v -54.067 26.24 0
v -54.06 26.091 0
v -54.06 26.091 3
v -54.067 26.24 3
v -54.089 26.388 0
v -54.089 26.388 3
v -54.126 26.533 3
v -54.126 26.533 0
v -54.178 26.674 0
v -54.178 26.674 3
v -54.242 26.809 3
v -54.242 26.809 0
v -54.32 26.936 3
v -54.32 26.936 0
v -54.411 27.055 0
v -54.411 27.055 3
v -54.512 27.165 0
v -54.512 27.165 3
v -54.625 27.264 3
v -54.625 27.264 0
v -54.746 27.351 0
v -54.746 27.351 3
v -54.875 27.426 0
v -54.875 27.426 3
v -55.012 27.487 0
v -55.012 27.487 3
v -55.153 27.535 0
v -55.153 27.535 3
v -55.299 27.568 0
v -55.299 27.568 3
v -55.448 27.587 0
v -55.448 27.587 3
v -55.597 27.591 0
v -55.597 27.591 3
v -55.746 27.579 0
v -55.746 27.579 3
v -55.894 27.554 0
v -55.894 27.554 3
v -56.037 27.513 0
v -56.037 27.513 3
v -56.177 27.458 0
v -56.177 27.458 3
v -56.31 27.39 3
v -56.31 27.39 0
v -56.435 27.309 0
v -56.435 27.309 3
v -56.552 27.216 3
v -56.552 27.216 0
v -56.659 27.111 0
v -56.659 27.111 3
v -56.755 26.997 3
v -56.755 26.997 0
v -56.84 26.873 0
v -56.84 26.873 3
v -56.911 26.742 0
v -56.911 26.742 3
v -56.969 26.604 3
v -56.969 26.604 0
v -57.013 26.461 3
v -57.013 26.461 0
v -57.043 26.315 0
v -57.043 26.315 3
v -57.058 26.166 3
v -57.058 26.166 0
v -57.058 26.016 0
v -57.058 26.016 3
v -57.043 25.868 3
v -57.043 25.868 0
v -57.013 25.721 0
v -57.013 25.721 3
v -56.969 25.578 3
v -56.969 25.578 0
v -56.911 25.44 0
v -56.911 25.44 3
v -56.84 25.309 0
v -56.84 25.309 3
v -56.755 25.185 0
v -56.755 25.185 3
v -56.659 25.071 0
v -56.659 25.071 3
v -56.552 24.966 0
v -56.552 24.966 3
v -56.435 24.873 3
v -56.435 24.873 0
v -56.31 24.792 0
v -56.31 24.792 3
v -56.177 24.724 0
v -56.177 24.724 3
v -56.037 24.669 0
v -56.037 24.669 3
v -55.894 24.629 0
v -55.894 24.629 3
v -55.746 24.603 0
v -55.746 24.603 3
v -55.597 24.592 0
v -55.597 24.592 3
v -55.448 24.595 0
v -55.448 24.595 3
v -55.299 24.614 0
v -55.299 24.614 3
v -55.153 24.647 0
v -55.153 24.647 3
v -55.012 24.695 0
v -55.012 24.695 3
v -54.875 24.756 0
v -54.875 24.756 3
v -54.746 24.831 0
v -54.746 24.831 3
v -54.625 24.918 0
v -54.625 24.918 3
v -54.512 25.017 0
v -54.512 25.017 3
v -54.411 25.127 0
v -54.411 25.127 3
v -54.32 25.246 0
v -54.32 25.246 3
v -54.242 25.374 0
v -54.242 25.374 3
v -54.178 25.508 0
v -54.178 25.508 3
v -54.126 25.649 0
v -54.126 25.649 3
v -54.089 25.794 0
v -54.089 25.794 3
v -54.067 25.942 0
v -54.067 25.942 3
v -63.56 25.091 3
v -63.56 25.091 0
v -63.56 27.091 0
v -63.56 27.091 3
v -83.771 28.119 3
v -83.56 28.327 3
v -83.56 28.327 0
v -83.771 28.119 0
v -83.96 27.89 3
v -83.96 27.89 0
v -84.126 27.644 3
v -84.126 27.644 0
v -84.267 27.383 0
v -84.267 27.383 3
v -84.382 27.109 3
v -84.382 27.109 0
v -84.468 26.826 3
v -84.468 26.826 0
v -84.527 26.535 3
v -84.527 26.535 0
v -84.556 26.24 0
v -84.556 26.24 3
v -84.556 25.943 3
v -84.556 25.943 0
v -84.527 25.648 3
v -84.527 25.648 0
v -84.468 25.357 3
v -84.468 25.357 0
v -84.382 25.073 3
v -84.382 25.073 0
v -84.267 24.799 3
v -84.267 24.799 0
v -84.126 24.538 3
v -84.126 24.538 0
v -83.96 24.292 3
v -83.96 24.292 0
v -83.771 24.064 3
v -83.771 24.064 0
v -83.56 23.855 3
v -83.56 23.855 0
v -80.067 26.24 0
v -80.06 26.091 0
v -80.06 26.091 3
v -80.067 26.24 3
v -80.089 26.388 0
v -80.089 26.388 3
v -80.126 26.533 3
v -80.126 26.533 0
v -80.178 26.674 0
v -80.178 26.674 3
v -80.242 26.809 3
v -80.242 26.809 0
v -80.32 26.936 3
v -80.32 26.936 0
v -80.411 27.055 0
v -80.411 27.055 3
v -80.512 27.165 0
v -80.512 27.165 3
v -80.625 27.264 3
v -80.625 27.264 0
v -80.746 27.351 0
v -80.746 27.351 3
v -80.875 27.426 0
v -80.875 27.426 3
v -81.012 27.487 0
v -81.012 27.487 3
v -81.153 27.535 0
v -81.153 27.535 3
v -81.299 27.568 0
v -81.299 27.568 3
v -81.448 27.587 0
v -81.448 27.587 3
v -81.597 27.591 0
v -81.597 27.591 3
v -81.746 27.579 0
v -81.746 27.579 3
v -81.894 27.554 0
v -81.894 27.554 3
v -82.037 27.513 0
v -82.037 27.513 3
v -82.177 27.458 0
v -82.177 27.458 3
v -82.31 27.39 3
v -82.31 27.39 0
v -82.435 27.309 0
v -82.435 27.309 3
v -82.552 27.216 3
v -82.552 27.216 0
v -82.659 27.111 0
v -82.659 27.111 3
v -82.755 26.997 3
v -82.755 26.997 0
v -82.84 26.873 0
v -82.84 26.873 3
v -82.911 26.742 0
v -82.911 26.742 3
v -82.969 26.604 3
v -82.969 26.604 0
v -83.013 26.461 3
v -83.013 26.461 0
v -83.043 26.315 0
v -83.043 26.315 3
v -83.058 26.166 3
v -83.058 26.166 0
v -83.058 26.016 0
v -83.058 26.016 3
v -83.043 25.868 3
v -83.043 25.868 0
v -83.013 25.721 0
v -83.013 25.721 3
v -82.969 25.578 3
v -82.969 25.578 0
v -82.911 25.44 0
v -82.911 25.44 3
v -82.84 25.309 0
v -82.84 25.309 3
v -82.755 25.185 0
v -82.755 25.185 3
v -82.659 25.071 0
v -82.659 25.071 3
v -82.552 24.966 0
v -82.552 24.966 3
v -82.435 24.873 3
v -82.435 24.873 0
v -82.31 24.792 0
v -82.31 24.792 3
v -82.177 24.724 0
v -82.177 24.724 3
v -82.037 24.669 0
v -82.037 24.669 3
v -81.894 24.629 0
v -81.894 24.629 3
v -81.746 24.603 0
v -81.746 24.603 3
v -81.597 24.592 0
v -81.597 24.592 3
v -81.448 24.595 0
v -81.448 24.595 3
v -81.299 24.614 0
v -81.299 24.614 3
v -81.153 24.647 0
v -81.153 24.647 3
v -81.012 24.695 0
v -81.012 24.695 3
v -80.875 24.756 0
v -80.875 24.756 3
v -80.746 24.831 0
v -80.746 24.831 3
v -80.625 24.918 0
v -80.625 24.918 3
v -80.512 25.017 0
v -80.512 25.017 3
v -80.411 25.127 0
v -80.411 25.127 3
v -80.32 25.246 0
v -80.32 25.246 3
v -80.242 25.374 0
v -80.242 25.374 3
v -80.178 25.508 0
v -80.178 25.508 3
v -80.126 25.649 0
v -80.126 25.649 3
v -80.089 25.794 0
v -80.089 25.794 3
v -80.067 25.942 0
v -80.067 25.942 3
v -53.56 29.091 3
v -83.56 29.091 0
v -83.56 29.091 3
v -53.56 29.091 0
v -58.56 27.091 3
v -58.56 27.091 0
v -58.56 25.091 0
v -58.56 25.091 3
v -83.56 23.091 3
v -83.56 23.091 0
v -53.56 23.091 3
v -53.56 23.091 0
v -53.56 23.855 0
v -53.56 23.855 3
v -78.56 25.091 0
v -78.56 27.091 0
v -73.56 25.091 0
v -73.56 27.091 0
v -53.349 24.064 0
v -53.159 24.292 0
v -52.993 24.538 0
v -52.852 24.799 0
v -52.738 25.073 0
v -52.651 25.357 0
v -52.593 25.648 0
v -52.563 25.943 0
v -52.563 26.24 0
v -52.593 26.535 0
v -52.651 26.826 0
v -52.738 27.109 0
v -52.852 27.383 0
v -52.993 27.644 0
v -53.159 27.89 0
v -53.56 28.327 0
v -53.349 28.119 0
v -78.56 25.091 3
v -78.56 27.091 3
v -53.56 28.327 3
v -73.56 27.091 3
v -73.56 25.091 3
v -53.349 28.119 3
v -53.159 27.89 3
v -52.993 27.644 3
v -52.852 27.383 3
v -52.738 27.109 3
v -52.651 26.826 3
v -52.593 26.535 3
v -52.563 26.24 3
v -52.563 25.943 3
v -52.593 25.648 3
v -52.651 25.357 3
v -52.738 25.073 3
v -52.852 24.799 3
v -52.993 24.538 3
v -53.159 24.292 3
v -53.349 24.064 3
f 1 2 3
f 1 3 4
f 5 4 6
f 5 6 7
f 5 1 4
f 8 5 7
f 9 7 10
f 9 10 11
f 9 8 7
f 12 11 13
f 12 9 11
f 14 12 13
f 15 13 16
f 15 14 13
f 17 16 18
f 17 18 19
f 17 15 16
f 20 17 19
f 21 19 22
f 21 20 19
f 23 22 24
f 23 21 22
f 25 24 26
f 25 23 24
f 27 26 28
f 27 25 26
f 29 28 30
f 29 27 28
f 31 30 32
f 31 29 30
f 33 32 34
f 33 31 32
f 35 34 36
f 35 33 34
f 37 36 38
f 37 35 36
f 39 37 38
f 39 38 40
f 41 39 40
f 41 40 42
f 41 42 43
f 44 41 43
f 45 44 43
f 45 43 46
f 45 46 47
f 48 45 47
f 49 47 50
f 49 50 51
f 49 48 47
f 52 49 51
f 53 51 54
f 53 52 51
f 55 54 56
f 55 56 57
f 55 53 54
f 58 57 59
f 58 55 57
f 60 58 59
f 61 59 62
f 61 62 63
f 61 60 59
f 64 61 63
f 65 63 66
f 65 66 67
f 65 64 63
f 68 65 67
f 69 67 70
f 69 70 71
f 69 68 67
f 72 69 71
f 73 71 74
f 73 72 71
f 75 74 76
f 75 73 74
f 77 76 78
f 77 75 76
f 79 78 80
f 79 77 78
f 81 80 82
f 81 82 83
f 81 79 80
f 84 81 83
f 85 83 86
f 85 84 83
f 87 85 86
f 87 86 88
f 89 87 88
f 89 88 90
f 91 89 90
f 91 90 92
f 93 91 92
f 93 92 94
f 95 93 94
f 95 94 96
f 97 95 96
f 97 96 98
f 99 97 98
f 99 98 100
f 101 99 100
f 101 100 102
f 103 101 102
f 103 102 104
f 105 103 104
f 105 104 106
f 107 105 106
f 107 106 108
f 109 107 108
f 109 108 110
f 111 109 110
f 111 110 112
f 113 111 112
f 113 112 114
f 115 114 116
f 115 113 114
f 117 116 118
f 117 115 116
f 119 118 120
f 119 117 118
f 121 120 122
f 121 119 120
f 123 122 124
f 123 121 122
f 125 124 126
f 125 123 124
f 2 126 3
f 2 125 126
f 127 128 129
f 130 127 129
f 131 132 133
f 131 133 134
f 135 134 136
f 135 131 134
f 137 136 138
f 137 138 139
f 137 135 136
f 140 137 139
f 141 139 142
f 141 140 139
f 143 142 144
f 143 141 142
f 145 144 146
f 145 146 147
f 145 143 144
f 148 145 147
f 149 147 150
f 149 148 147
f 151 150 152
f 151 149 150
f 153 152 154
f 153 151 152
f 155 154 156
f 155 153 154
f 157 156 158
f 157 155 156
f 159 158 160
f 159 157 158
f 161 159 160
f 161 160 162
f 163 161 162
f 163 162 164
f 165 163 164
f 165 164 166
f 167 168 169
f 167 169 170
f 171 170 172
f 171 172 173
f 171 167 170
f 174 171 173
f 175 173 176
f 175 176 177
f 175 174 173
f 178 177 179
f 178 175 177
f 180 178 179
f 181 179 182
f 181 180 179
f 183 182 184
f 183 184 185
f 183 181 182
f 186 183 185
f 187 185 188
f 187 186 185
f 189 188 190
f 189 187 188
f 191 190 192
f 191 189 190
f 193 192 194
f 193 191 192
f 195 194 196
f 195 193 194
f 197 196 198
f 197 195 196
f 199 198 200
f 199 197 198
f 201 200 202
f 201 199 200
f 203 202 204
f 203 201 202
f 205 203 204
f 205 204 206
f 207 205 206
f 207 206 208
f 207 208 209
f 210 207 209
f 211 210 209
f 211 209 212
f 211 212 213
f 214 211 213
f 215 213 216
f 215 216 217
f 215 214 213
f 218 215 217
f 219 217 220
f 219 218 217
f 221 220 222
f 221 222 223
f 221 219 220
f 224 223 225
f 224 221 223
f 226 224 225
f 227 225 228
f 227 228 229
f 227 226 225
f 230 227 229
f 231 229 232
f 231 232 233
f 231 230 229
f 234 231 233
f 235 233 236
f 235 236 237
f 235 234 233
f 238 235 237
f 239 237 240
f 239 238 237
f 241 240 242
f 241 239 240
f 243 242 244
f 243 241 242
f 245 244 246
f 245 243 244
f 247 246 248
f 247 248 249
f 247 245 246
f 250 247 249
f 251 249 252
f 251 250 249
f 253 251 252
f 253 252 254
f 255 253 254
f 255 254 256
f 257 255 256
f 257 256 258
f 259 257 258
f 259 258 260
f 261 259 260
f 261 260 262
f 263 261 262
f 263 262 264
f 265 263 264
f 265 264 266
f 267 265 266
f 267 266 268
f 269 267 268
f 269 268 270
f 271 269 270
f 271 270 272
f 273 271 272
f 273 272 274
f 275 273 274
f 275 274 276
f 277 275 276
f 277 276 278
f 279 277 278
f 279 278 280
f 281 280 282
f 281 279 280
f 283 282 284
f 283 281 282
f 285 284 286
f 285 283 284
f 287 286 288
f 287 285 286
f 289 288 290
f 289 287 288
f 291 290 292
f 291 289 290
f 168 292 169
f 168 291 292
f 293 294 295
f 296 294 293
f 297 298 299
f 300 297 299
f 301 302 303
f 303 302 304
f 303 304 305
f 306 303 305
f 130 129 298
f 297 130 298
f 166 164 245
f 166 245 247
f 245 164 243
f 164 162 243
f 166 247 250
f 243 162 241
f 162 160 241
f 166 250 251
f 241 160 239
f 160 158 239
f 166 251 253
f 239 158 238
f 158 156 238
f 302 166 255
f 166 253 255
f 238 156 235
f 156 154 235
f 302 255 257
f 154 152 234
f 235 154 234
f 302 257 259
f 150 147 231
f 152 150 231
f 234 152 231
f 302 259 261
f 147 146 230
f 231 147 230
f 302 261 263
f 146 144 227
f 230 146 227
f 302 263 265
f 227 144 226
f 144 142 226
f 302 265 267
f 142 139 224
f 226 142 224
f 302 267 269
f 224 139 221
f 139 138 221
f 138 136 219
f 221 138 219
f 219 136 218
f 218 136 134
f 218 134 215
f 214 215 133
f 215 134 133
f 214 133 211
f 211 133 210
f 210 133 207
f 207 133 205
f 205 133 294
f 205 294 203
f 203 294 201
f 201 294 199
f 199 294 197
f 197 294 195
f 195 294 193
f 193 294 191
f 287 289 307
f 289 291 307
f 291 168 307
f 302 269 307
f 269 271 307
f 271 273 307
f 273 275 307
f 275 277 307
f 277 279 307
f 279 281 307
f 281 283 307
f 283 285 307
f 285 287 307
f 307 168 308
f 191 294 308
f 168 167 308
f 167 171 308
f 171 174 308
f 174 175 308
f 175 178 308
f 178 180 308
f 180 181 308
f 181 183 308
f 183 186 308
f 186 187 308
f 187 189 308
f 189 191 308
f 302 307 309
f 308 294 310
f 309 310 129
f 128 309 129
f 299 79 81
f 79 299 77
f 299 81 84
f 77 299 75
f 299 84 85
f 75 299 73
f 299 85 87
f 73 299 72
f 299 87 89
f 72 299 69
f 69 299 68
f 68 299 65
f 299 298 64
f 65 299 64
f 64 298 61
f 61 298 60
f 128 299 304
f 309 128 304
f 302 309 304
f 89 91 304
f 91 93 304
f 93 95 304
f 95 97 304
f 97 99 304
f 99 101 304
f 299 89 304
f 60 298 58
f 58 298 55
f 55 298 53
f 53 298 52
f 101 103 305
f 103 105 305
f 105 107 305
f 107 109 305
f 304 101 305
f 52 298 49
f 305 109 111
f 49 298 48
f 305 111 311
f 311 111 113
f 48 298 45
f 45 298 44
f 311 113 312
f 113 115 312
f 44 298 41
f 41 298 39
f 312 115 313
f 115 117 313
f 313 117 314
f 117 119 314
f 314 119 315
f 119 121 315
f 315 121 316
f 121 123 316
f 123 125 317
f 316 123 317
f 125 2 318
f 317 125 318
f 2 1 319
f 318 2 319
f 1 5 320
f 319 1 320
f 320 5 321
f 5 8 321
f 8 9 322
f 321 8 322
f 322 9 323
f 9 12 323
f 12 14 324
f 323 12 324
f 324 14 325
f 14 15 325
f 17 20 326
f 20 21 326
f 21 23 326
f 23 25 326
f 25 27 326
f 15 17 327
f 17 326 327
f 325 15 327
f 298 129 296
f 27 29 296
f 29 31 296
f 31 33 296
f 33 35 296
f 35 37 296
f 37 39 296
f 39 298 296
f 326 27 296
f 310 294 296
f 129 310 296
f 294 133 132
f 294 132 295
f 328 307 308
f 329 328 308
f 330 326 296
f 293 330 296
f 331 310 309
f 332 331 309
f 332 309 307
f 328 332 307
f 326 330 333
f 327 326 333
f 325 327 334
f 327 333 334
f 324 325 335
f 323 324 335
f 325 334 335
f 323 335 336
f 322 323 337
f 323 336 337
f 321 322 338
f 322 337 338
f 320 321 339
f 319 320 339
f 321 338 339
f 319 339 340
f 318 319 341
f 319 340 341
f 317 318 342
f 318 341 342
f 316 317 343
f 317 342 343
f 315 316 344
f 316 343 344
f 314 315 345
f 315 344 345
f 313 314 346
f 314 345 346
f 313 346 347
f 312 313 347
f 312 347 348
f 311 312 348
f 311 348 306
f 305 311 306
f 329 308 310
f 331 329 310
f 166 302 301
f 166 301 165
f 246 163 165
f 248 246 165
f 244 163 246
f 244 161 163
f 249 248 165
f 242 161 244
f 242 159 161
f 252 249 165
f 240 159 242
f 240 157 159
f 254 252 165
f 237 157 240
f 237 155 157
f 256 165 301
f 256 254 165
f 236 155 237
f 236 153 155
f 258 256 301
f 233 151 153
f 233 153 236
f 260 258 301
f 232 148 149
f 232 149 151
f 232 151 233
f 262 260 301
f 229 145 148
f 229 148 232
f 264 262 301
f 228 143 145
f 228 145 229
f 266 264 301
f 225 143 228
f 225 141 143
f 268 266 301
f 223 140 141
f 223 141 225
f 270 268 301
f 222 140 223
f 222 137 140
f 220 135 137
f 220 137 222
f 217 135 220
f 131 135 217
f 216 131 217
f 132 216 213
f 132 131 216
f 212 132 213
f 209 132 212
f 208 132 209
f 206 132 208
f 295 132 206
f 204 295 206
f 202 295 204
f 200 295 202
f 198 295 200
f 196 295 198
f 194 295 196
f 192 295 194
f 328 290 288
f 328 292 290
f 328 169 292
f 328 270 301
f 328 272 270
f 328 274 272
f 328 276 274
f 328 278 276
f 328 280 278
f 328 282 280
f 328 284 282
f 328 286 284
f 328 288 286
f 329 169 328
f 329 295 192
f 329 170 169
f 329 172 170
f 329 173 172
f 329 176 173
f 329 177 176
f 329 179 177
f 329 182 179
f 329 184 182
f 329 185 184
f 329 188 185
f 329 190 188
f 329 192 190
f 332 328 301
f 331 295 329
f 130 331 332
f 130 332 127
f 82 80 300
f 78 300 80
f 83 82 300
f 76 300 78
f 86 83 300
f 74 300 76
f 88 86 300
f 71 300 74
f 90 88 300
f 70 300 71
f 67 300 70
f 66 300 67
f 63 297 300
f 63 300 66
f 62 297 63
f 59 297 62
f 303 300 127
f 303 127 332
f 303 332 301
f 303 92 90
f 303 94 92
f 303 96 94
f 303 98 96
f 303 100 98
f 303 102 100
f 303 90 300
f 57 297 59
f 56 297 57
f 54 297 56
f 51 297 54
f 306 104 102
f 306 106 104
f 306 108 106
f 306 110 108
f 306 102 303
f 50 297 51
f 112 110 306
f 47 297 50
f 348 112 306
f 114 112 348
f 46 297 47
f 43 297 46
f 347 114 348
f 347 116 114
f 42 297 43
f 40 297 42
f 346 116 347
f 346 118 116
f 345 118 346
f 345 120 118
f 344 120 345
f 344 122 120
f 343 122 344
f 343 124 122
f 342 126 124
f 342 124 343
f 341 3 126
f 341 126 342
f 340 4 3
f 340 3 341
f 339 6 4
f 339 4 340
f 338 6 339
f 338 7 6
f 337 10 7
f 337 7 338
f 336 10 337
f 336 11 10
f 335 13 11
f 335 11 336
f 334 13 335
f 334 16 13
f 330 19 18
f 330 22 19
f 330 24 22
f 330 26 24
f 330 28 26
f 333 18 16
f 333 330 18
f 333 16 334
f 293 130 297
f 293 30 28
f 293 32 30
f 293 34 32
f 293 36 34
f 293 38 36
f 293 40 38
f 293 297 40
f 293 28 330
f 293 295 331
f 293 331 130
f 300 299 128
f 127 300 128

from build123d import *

# Parameters (mm, degrees)
SKETCH1_W           = 30
SKETCH1_H           = 6
SKETCH1_R           = 1.5
BOSS_EXTRUDE1_DEPTH = 3
BOSS_EXTRUDE3_DEPTH = 3


with BuildPart() as part:
    # Sketch1 → Boss-Extrude1 (new body)
    with BuildSketch(Plane.XY):
        with Locations((-68.559747397, 26.091138903)):
            Rectangle(SKETCH1_W, SKETCH1_H)
        with Locations((-81.559747397, 26.091138903)):
            Circle(SKETCH1_R, mode=Mode.SUBTRACT)
        with Locations((-55.559747397, 26.091138903)):
            Circle(SKETCH1_R, mode=Mode.SUBTRACT)
        Polygon((-78.559747397, 26.091138903), (-78.559747397, 27.091138903), (-73.559747397, 27.091138903), (-73.559747397, 25.091138903), (-78.559747397, 25.091138903), align=None, mode=Mode.SUBTRACT)
        Polygon((-58.559747397, 26.091138903), (-58.559747397, 25.091138903), (-63.559747397, 25.091138903), (-63.559747397, 27.091138903), (-58.559747397, 27.091138903), align=None, mode=Mode.SUBTRACT)
    extrude(amount=BOSS_EXTRUDE1_DEPTH)

    # Sketch3 → Boss-Extrude3 (add)
    with BuildSketch(Plane.XY.offset(3)):
        with BuildLine():
            Line((-83.559747397, 26.091138903), (-83.559747397, 28.32720688))
            ThreePointArc((-83.559747397, 28.32720688), (-84.559747397, 26.091138903), (-83.559747397, 23.855070925))
            Line((-83.559747397, 23.855070925), (-83.559747397, 26.091138903))
        make_face()
        with BuildLine():
            Line((-53.559747397, 26.091138903), (-53.559747397, 28.32720688))
            ThreePointArc((-53.559747397, 28.32720688), (-52.559747397, 26.091138903), (-53.559747397, 23.855070925))
            Line((-53.559747397, 23.855070925), (-53.559747397, 26.091138903))
        make_face()
    extrude(amount=-BOSS_EXTRUDE3_DEPTH)


solid = part.part
